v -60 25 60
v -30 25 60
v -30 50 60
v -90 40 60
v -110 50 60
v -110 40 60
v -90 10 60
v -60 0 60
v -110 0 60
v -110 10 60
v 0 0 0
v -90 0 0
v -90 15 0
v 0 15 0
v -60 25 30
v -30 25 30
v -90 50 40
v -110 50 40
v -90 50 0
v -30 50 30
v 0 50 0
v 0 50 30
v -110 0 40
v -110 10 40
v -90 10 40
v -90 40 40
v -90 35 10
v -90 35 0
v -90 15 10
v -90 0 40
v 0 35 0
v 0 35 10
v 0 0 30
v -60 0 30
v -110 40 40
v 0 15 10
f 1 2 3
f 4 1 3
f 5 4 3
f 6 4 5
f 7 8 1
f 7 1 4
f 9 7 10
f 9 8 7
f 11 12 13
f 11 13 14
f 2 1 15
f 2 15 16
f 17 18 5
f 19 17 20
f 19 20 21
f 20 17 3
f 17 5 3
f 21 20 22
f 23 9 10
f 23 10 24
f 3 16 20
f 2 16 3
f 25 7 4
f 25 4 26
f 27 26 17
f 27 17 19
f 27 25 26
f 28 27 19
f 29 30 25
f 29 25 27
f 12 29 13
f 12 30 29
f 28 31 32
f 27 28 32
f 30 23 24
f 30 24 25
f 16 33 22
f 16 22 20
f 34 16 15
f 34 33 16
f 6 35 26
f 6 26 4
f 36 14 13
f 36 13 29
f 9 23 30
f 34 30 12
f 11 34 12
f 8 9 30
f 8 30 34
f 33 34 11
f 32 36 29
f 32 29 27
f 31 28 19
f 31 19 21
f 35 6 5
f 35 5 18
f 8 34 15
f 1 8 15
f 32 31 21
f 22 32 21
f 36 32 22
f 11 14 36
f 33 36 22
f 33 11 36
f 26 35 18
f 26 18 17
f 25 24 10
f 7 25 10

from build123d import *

# Parameters (mm, degrees)
F1_DEPTH      = 50
F2_W          = 30
F2_H          = 40
F3_DEPTH      = 20
F4_W          = 30
F4_H          = 25
F5_DEPTH      = 30
F5_DEPTH_BACK = 25
F6_W          = 20
F6_H          = 20
F7_DEPTH      = 90


with BuildPart() as f1:
    # F0 (on Front) → F1 (new body)
    with BuildSketch(Plane.XZ):
        Polygon((-90, 0), (0, 0), (0, 30), (-30, 30), (-30, 60), (-110, 60), (-110, 40), (-90, 40), align=None)
    extrude(amount=-F1_DEPTH)

    # F2 (on face) → F3 (cut)
    with BuildSketch(Plane(origin=(-110, 0, 0), x_dir=(0, -1, 0), z_dir=(-1, 0, 0))):
        with Locations((-25, 60)):
            Rectangle(F2_W, F2_H)
    extrude(amount=-F3_DEPTH, mode=Mode.SUBTRACT)

    # F4 (on face) → F5 (cut, two sides)
    with BuildSketch(Plane.XY.offset(60)) as f5_sk:
        with Locations((-45, 12.5)):
            Rectangle(F4_W, F4_H)
    extrude(amount=-F5_DEPTH, mode=Mode.SUBTRACT)
    extrude(f5_sk.sketch, amount=-F5_DEPTH_BACK, mode=Mode.SUBTRACT)

    # F6 (on face) → F7 (cut)
    with BuildSketch(Plane.YZ):
        with Locations((25, 0)):
            Rectangle(F6_W, F6_H)
    extrude(amount=-F7_DEPTH, mode=Mode.SUBTRACT)


solid = f1.part
